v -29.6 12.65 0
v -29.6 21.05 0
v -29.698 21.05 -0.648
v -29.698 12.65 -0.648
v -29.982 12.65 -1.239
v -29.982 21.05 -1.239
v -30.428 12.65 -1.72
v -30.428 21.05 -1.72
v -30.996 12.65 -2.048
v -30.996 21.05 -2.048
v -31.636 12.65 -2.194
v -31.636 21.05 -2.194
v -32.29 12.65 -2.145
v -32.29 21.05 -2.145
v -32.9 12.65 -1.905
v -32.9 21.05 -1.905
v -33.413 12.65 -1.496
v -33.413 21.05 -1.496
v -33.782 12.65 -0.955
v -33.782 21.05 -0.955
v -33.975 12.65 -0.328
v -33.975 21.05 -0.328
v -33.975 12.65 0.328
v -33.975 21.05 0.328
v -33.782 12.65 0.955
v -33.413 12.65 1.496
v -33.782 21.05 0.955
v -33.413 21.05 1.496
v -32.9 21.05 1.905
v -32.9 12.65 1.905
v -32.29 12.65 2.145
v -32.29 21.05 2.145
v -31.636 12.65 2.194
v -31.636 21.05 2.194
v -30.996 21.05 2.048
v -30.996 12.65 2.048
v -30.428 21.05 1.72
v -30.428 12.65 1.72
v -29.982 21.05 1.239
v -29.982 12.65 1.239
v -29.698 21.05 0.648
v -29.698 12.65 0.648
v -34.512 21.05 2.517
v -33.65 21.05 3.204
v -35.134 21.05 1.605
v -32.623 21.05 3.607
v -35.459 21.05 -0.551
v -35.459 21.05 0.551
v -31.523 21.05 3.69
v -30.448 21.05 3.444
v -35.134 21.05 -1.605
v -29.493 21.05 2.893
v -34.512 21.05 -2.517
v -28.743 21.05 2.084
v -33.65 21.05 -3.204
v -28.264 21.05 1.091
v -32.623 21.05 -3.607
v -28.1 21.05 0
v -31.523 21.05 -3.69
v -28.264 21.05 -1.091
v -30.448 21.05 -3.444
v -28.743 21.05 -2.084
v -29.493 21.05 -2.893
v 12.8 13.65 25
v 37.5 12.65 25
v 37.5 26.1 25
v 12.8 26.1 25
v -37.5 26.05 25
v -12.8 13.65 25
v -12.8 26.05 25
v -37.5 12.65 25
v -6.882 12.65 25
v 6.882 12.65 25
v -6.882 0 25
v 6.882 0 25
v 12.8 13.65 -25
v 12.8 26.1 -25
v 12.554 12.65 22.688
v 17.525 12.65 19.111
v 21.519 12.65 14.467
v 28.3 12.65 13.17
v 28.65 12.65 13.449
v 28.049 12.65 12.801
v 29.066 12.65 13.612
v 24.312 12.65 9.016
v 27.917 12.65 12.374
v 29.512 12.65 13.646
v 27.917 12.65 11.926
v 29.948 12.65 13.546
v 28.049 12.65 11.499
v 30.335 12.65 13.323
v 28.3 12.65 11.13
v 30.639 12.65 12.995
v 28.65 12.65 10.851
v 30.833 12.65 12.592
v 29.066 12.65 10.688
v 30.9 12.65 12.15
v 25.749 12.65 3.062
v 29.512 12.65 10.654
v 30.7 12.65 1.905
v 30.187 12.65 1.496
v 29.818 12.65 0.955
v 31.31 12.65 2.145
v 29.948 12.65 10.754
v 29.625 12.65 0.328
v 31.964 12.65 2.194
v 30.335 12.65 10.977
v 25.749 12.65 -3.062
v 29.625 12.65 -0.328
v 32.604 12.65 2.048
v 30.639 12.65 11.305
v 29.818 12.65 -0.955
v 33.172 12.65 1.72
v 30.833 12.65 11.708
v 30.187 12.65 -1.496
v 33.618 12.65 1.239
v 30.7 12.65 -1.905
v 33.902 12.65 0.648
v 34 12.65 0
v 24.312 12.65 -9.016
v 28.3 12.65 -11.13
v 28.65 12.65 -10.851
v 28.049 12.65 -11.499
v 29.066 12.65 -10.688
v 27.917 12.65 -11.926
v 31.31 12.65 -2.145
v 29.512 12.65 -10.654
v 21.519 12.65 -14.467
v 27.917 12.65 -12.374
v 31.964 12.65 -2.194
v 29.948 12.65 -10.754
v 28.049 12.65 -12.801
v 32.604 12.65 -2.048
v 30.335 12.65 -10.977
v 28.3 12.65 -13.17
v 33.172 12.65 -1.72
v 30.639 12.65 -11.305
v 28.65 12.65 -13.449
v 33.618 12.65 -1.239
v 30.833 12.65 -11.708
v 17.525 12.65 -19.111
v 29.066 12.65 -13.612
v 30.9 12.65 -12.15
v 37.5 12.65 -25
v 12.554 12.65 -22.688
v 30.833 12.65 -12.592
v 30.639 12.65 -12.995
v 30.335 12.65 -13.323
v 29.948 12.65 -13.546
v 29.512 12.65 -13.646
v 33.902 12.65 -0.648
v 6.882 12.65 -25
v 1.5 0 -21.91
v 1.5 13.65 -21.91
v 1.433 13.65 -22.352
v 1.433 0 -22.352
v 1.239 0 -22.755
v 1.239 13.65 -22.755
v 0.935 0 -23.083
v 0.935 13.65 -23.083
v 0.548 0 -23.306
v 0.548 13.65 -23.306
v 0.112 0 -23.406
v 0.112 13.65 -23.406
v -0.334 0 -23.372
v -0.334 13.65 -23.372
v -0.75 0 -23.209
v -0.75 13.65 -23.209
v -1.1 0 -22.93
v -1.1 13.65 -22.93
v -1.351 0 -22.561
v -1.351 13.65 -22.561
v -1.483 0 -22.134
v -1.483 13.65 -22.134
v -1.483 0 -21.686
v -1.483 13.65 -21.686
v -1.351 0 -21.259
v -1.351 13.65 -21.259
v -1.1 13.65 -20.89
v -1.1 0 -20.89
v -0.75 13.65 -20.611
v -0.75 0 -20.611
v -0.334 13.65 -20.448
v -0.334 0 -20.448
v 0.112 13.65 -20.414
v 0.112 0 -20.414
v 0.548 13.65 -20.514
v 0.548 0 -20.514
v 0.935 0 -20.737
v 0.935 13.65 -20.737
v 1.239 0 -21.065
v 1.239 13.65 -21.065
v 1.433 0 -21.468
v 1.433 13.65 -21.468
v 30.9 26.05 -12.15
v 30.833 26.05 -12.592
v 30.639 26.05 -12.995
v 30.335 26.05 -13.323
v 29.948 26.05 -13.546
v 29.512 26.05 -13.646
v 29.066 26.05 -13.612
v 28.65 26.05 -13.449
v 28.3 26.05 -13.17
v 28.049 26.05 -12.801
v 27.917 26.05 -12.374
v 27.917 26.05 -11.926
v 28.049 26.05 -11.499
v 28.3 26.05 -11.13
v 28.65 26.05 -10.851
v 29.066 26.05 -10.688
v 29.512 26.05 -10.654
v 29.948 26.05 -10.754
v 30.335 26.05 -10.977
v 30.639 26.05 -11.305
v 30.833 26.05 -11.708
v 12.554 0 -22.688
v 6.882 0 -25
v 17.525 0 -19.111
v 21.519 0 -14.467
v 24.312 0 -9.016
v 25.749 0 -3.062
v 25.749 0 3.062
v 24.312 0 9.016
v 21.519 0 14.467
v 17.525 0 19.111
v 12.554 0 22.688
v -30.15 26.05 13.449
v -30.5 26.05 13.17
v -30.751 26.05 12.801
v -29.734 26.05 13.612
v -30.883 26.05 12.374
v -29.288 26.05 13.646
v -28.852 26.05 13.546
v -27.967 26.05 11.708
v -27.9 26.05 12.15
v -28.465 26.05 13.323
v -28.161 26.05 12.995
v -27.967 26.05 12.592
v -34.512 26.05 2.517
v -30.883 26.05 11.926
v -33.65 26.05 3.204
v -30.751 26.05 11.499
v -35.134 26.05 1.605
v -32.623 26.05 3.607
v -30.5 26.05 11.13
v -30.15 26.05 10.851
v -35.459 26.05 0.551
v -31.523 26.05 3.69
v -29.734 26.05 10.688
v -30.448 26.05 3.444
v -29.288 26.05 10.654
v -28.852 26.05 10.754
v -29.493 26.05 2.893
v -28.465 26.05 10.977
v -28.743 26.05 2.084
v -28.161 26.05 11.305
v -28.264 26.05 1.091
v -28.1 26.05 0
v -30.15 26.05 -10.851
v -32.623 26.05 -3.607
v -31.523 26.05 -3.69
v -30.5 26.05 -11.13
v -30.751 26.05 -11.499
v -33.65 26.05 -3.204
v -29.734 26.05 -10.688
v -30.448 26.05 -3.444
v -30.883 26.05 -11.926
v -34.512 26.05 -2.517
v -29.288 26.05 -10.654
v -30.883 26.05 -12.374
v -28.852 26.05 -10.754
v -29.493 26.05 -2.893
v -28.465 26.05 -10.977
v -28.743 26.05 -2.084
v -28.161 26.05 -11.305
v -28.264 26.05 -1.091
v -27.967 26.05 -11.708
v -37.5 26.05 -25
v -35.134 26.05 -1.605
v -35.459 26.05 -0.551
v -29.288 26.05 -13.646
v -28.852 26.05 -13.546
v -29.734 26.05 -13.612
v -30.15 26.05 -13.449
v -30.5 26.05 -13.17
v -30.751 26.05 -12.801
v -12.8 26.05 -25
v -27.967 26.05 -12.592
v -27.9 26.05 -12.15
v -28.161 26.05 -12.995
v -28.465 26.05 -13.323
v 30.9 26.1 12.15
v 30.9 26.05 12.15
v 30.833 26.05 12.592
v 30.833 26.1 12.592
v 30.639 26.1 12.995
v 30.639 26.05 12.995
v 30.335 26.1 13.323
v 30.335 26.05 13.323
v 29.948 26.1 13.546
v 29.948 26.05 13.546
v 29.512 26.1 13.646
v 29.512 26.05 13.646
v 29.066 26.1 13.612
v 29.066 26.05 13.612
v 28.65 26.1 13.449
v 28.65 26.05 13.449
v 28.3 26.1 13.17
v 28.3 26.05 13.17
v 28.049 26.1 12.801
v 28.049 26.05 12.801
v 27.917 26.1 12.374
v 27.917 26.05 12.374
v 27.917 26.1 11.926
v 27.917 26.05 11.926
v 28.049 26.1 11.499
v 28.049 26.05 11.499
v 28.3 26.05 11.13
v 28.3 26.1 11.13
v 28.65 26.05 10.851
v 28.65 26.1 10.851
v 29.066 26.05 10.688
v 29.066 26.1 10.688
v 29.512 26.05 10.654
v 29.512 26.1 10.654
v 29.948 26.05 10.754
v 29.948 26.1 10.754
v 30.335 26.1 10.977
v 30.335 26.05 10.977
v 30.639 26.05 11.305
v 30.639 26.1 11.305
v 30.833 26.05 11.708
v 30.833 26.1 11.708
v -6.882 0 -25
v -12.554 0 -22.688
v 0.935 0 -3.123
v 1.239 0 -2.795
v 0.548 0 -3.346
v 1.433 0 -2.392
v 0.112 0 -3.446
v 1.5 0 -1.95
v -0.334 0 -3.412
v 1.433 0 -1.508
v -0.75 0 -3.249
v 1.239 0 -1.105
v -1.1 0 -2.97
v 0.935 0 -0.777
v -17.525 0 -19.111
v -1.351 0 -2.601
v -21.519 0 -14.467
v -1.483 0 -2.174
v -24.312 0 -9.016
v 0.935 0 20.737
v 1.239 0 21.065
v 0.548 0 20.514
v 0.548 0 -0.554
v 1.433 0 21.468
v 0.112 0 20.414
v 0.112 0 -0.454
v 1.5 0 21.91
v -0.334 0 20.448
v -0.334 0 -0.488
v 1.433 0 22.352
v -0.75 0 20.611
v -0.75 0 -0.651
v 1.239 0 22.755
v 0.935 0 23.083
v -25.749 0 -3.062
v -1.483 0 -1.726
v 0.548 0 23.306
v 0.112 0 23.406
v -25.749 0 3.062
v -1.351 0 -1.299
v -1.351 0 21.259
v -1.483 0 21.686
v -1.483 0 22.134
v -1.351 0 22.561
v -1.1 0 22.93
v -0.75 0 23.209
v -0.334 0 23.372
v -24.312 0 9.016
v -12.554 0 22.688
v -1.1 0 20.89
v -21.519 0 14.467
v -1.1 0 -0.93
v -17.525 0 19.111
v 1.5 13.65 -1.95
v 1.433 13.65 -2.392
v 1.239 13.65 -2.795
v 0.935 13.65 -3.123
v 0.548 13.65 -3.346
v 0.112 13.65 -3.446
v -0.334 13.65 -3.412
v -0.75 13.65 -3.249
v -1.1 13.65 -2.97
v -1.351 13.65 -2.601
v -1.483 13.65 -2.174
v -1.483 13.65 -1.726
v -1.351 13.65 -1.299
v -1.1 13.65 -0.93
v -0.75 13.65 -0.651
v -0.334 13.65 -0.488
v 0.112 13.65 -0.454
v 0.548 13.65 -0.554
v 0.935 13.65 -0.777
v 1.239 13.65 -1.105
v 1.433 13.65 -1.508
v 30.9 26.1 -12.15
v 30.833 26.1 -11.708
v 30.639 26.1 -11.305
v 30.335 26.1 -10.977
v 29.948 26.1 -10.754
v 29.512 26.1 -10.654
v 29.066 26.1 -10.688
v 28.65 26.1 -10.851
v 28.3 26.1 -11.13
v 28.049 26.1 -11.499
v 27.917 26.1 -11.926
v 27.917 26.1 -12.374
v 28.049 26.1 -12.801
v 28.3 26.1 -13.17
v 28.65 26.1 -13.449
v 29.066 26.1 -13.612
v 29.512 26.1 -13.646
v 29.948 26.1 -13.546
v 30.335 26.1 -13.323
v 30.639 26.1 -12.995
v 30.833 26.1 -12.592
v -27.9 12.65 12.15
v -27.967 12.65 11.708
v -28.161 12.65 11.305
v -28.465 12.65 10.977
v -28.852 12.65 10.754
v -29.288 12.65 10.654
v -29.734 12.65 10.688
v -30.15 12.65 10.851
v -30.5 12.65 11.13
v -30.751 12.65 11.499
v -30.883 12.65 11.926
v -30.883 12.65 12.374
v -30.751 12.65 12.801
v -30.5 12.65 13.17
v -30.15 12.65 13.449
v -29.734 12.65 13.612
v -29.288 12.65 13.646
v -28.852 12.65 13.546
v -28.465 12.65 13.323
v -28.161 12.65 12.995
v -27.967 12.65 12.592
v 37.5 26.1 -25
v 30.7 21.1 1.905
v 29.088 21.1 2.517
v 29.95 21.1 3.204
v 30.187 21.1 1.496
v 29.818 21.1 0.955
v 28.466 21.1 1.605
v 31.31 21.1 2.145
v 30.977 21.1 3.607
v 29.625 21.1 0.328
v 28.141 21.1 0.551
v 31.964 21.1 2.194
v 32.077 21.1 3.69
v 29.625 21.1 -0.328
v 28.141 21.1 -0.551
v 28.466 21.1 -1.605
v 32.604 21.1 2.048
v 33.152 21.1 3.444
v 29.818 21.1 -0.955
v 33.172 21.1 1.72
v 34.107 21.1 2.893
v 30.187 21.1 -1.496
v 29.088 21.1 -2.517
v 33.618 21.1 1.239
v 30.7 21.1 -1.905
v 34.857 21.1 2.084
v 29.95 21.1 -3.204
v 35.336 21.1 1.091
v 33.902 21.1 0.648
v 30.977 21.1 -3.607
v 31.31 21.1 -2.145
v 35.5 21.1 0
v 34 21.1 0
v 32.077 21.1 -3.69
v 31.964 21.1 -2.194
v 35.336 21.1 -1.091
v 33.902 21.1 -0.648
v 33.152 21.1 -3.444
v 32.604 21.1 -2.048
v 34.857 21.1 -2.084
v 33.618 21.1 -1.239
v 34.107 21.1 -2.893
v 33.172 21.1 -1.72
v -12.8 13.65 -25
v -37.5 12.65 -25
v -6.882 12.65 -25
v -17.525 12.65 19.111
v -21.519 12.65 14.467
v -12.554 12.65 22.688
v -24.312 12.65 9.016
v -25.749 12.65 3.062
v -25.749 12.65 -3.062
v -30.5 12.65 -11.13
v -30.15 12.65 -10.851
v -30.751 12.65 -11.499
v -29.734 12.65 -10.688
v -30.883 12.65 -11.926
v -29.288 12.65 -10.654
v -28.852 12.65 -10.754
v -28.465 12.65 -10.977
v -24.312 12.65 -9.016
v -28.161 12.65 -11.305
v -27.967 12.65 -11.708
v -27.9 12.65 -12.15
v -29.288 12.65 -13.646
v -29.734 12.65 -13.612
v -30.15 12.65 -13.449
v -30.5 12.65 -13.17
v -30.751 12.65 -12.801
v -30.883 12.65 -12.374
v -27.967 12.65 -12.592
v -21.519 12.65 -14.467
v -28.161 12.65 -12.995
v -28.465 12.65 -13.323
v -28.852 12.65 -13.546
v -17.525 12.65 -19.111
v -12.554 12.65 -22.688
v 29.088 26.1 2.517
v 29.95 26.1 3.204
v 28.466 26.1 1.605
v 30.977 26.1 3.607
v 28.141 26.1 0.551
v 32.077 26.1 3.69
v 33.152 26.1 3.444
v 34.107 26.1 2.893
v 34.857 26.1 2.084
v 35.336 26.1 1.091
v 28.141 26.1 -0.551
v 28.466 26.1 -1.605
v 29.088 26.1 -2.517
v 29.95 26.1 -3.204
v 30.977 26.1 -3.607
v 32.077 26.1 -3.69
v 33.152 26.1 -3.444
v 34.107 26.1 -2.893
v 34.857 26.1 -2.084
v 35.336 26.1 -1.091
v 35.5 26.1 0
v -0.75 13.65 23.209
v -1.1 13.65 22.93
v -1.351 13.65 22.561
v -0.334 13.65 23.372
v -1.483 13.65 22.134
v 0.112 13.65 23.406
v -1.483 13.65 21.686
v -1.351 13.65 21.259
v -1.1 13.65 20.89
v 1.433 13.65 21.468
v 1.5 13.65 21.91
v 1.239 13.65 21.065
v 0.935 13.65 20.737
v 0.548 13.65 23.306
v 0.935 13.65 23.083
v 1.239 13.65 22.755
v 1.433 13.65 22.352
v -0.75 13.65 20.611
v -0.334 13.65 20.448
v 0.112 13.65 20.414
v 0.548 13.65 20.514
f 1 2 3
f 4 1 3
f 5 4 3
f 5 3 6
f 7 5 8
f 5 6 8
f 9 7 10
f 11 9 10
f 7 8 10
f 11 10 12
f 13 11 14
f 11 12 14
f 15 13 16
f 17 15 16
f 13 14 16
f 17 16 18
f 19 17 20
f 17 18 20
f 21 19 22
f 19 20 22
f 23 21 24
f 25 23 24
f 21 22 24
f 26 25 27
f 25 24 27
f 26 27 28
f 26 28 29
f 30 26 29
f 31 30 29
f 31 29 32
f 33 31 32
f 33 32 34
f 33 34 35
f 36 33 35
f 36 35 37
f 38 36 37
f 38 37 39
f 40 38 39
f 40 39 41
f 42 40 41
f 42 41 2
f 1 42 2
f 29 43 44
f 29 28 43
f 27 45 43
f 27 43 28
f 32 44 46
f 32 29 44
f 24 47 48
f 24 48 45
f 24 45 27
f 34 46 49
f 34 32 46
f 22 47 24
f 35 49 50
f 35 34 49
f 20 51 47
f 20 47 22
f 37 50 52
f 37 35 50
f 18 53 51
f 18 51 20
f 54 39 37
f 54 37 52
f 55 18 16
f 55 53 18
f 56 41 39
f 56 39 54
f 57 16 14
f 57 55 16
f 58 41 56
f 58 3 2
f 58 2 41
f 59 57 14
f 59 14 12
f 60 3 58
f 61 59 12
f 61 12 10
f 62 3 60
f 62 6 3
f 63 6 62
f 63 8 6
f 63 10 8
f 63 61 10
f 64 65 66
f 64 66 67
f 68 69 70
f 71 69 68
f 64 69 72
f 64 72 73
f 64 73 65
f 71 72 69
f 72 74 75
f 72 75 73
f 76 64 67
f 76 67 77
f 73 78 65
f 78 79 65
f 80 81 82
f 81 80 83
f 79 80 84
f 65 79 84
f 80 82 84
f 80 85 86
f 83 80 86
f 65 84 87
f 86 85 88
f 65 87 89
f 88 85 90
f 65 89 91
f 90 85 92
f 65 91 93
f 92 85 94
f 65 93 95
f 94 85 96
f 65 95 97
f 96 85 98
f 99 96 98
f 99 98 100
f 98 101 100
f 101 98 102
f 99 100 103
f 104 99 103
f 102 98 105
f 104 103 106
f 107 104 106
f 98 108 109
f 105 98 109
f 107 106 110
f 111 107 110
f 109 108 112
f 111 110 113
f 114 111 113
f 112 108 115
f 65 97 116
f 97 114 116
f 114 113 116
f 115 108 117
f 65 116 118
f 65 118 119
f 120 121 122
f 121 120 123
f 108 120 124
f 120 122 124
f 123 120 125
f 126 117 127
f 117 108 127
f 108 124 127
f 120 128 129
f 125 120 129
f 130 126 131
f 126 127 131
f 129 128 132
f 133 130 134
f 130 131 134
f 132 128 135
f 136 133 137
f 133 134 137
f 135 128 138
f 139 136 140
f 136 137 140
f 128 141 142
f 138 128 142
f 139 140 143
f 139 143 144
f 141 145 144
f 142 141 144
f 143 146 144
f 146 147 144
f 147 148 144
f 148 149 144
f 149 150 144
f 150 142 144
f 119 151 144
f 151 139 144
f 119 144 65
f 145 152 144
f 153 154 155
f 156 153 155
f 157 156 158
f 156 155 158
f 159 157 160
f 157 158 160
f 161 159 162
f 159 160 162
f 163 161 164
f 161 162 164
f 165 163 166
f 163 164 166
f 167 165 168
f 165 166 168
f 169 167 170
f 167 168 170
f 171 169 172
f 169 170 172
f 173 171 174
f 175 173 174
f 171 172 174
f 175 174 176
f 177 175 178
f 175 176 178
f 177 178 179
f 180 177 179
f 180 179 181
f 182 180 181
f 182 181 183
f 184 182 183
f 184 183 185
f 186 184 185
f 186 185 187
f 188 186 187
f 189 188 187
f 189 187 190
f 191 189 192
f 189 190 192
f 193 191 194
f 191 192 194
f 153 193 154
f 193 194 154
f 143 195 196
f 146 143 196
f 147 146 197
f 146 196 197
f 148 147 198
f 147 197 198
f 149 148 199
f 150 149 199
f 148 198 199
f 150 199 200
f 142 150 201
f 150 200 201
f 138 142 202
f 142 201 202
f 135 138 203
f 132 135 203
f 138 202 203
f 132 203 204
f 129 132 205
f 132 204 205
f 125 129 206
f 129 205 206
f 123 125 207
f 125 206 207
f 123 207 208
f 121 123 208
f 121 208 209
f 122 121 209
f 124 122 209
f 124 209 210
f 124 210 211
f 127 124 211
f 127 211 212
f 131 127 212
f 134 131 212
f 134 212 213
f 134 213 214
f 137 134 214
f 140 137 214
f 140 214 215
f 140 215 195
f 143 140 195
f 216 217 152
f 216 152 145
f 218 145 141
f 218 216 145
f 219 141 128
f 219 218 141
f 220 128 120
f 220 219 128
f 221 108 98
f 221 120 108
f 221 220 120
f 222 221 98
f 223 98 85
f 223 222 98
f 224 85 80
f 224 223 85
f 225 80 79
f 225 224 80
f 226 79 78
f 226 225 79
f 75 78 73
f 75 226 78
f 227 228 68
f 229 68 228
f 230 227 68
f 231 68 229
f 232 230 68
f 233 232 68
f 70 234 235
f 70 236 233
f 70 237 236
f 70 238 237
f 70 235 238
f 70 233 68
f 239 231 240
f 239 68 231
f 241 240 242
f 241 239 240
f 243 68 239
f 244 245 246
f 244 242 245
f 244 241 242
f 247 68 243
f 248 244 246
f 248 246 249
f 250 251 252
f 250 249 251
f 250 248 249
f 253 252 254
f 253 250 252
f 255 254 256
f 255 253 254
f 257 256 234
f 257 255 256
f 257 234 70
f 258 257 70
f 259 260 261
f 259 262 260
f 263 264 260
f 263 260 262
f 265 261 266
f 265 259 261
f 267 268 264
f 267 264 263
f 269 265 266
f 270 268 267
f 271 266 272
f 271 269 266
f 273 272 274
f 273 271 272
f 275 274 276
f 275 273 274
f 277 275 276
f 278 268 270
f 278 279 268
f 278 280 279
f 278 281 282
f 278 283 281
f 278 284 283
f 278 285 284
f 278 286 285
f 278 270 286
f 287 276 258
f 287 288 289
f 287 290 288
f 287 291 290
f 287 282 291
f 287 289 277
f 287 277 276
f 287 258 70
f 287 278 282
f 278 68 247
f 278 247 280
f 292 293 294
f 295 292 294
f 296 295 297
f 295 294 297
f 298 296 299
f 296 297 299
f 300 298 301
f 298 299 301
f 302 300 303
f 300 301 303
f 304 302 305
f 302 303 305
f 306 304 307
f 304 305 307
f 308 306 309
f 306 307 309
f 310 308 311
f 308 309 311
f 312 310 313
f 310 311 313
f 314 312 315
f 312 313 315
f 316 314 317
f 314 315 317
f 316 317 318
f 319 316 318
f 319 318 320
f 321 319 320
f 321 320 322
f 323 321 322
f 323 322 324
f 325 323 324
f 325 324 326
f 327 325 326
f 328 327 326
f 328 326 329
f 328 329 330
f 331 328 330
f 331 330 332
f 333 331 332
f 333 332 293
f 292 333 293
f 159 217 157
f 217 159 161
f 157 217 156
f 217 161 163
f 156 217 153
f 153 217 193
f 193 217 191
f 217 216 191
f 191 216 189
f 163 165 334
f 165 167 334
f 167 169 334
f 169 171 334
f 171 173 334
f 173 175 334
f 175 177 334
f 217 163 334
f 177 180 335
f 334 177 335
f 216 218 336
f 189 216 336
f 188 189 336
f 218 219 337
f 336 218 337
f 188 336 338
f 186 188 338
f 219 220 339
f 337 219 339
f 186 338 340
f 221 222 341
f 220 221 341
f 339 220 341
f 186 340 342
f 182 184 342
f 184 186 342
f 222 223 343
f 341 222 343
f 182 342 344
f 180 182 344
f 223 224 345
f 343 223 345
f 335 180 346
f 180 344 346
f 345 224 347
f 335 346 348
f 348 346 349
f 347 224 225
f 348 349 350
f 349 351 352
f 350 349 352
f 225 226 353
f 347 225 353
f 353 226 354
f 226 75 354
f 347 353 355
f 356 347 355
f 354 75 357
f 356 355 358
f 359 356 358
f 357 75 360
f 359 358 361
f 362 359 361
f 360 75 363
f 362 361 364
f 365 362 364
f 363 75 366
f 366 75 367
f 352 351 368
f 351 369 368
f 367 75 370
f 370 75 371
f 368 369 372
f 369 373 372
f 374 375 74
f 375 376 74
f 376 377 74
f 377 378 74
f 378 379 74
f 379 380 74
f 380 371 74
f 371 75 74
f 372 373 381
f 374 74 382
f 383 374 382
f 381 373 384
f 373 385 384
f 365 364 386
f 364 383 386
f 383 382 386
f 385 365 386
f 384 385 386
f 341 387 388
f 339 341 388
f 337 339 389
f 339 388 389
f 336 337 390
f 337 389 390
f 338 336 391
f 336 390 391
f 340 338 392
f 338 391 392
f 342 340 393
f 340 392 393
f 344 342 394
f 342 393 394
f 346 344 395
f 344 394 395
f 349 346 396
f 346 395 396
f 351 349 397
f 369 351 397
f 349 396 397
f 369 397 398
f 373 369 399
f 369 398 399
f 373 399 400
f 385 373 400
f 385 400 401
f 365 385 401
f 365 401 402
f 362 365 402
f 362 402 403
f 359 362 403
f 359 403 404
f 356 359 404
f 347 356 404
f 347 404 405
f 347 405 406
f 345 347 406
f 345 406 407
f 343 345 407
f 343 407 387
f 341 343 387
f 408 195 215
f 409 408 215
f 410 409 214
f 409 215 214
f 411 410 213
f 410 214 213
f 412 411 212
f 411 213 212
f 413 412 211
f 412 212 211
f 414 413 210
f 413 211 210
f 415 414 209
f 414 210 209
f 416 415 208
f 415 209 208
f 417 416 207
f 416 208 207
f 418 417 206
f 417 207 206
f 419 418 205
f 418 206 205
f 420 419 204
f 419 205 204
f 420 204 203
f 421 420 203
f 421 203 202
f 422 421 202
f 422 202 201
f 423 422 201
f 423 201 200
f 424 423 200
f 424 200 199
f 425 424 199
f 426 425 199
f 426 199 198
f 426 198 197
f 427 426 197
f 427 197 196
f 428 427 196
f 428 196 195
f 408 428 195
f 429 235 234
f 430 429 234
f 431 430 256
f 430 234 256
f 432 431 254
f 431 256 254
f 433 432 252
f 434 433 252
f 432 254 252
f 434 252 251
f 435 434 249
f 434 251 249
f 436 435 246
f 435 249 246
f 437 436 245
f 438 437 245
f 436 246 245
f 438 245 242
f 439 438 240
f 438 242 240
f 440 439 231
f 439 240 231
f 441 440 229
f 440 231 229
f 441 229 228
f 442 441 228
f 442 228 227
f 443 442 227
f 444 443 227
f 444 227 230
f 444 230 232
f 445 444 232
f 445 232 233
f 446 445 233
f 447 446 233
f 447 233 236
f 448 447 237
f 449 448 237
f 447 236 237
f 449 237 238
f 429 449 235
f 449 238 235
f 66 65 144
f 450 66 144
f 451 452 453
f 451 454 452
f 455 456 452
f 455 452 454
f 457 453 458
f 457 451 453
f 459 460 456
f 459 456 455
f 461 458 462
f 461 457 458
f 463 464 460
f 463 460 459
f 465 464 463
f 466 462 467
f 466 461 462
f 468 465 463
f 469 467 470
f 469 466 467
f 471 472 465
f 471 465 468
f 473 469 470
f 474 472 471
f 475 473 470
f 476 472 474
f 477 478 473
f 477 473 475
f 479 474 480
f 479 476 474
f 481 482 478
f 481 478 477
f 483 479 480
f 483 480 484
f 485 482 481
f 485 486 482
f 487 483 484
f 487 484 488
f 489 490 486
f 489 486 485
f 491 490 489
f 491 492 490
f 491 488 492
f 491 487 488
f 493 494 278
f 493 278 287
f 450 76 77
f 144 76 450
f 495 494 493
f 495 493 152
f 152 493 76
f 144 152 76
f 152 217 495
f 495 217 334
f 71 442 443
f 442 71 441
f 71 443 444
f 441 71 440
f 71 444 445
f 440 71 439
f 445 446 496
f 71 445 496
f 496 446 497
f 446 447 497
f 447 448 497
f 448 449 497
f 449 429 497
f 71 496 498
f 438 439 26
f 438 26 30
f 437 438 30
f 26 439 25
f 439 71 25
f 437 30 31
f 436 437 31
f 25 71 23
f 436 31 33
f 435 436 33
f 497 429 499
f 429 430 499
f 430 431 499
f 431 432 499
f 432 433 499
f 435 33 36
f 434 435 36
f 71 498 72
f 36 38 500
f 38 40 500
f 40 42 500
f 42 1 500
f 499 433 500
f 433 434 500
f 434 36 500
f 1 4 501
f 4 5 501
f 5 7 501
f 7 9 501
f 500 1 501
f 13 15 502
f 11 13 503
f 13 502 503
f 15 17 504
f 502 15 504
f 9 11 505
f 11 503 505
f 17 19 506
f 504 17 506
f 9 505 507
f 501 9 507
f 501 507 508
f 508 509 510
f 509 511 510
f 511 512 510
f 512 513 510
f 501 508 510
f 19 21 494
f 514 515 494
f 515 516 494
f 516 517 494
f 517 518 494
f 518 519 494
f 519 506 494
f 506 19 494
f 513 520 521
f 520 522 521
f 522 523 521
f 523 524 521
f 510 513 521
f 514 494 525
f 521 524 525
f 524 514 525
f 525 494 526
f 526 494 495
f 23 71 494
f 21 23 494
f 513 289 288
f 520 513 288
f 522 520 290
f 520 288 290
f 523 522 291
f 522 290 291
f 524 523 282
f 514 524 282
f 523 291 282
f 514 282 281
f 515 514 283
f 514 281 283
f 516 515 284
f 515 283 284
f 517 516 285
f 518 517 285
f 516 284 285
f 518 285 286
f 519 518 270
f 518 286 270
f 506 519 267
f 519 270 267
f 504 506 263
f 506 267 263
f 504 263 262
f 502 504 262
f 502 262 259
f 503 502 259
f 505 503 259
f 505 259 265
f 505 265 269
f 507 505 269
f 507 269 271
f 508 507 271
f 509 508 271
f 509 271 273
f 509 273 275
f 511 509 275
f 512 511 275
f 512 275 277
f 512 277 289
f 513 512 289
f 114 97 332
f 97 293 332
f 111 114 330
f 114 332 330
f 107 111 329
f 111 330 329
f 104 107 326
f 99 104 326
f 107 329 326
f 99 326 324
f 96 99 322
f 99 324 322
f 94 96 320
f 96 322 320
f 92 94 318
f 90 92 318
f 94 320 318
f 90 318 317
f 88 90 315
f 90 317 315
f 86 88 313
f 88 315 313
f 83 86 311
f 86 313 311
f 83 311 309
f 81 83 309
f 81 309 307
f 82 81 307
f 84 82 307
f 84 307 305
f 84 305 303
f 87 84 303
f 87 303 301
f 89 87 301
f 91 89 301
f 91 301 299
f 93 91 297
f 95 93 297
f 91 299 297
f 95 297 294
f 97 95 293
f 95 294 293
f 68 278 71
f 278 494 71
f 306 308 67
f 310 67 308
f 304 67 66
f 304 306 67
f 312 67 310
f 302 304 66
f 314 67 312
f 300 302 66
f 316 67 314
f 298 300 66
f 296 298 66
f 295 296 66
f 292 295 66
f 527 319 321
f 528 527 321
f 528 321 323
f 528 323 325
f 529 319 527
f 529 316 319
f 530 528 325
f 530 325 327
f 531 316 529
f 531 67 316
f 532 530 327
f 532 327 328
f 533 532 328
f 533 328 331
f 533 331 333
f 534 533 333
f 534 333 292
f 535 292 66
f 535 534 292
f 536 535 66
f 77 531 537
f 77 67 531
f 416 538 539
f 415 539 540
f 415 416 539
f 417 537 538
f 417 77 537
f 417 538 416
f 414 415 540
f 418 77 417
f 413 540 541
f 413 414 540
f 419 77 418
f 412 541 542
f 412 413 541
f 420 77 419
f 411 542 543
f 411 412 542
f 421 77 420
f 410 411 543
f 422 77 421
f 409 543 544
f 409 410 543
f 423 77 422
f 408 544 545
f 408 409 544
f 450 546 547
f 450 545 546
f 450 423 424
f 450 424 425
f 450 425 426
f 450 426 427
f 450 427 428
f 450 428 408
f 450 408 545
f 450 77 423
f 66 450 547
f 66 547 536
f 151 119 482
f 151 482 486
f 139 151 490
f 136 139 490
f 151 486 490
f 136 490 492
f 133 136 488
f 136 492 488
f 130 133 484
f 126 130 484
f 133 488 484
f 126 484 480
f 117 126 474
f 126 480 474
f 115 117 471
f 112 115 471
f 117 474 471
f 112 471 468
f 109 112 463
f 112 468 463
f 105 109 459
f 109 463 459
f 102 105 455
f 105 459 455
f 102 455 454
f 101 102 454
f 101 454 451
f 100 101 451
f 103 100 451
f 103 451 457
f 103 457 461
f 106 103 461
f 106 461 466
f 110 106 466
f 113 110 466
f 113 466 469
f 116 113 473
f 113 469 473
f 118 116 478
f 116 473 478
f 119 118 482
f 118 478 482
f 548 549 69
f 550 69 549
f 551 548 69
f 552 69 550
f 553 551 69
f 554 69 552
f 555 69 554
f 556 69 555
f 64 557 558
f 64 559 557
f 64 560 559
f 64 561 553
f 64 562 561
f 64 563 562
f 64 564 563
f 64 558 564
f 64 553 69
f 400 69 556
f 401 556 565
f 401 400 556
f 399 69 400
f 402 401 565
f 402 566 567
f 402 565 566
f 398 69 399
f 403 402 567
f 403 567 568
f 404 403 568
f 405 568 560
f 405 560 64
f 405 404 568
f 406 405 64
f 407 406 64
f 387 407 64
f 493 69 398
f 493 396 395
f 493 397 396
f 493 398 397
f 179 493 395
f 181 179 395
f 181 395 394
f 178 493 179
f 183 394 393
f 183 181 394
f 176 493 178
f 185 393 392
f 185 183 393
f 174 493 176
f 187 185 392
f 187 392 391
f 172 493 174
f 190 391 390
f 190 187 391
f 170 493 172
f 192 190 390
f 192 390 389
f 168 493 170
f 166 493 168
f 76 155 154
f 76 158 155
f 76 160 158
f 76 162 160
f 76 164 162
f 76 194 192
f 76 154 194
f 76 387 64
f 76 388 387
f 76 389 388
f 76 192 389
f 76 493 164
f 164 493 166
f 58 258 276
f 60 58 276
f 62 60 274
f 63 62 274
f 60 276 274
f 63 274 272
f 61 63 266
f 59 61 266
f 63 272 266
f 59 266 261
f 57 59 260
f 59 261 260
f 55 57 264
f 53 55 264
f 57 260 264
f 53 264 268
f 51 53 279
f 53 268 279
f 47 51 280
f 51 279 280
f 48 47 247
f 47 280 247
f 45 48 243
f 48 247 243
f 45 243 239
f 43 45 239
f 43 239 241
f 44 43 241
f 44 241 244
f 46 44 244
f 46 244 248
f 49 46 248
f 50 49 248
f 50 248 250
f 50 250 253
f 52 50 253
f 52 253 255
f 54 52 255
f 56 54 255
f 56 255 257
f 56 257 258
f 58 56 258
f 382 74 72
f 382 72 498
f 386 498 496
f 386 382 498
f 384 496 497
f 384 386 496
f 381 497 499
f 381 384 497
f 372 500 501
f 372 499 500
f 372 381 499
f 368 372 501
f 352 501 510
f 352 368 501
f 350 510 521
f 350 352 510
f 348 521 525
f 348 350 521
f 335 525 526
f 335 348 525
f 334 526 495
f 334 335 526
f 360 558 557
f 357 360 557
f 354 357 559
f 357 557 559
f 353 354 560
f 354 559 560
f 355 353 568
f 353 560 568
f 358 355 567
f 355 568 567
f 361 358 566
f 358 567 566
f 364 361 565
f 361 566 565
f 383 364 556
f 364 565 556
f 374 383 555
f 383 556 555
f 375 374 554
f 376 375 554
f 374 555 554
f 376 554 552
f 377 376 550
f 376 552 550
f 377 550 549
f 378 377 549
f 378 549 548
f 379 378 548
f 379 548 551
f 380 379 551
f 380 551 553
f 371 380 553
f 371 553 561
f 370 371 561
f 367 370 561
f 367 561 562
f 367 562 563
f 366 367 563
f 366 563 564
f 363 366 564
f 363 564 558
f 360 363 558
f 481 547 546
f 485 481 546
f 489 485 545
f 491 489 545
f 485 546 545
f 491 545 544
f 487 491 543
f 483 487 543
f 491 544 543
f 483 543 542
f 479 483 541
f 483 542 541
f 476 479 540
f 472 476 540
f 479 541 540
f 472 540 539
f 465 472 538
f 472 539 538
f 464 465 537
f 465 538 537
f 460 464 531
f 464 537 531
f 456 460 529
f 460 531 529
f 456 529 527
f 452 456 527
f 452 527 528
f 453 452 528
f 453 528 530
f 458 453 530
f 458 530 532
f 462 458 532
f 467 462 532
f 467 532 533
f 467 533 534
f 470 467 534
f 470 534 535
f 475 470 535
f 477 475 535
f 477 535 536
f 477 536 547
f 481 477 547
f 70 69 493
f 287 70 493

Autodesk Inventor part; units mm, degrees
ref_plane "YZ Plane" through (0, 0, 0) normal (1, 0, 0) x (0, 1, 0)
ref_plane "XZ Plane" through (0, 0, 0) normal (0, 1, 0) x (-1, 0, 0)
ref_plane "XY Plane" through (0, 0, 0) normal (0, 0, 1) x (1, 0, 0)
sketch "Sketch1" plane through (0, 0, 0) normal (0, 1, 0) x (-1, 0, 0)
  line L0 (37.5, -25) -> (-37.5, -25) construction
  line L1 (-37.5, -25) -> (-37.5, 25) construction
  line L2 (-37.5, 25) -> (37.5, 25) construction
  line L3 (37.5, 25) -> (37.5, -25) construction
  arc A0 (6.8822, -25) -> (6.8822, 25) centre (0, 0) ccw
  arc A1 (-6.8822, 25) -> (-6.8822, -25) centre (0, 0) ccw
  line L4 (6.8822, -25) -> (-6.8822, -25)
  line L5 (-6.8822, 25) -> (6.8822, 25)
  dimension "d4" = 50
  dimension "d5" = 75
extrude "Extrusion1" add sketch "Sketch1" along normal blind 12.65
sketch "Sketch2" plane through (0, 12.65, 0) normal (0, 1, 0) x (1, 0, 0)
  line L0 (-37.5, 25) -> (37.5, 25) construction
  line L1 (-37.5, -25) -> (-37.5, 25) construction
  line L2 (37.5, 25) -> (37.5, -25) construction
  line L3 (37.5, -25) -> (-37.5, -25) construction
  line L4 (-37.5, 25) -> (37.5, 25)
  line L5 (37.5, -25) -> (37.5, 25)
  line L6 (37.5, -25) -> (-37.5, -25)
  line L7 (-37.5, -25) -> (-37.5, 25)
  point P0 (0, 0)
extrude "Extrusion2" add sketch "Sketch2" along normal blind 1
sketch "Sketch3" plane through (0, 13.65, 0) normal (0, 1, 0) x (1, 0, 0)
  line L0 (37.5, -25) -> (6.8822, -25) projected
  line L1 (12.8, -25) -> (12.8, 25)
  line L2 (12.8, 25) -> (37.5, 25)
  line L3 (37.5, -25) -> (37.5, 25) projected
  line L4 (37.5, 25) -> (37.5, -25)
  line L5 (37.5, -25) -> (12.8, -25)
  line L6 (-12.8, -25) -> (-12.8, 25)
  line L7 (-37.5, 25) -> (-37.5, -25) projected
  line L8 (-12.8, 25) -> (-37.5, 25)
  line L9 (-37.5, 25) -> (-37.5, -25)
  line L10 (-37.5, -25) -> (-12.8, -25)
  point P0 (0, 0)
  dimension "d12" = 25.6
  dimension "d13" = 24.7
  dimension "d14" = 24.7
extrude "Extrusion3" add sketch "Sketch3" along normal blind 12.4 contours L10 L7 L8 L6
extrude "Extrusion4" add sketch "Sketch3" along normal blind 12.45 contours L0 L1 L2 L3
sketch "Sketch4" plane through (0, 13.65, 0) normal (0, 1, 0) x (1, 0, 0)
  circle A0 centre (0, 21.91) radius 1.5
  circle A1 centre (0, -21.91) radius 1.5
  circle A2 centre (0, 1.95) radius 1.5
  line L0 (12.8, 25) -> (12.8, -25) projected
  point P0 (0, 0)
  dimension "d21" = 3
  dimension "d23" = 3
  dimension "d25" = 3
  dimension "d26" = 21.91
  dimension "d27" = 23.86
  dimension "d28" = 21.91
  dimension "d29" = 12.8
extrude "Extrusion5" cut sketch "Sketch4" against normal blind 18.8
sketch "Sketch5" plane through (0, 26.05, 0) normal (0, 1, 0) x (1, 0, 0)
  circle A0 centre (-29.4, 12.15) radius 1.5
  circle A1 centre (-29.4, -12.15) radius 1.5
  circle A2 centre (-31.8, 0) radius 2.2
  line L0 (-37.5, 25) -> (-37.5, -25) projected
  circle A3 centre (29.4, 12.15) radius 1.5
  circle A4 centre (29.4, -12.15) radius 1.5
  circle A5 centre (31.8, 0) radius 2.2
  circle A6 centre (29.4, 12.15) radius 1.5
  circle A7 centre (29.4, -12.15) radius 1.5
  circle A8 centre (31.8, 0) radius 2.2
  point P0 (0, 0)
  dimension "d35" = 3
  dimension "d36" = 3
  dimension "d37" = 4.4
  dimension "d38" = 8.1
  dimension "d41" = 5.7
extrude "Extrusion6" cut sketch "Sketch5" along normal mid plane 35
sketch "Sketch7" plane through (0, 26.1, 0) normal (0, 1, 0) x (1, 0, 0)
  circle A0 centre (31.8, 0) radius 3.7
  point P0 (0, 0)
  dimension "d44" = 7.4
extrude "Extrusion7" cut sketch "Sketch7" against normal blind 5
sketch "Sketch8" plane through (0, 26.05, 0) normal (0, 1, 0) x (1, 0, 0)
  circle A0 centre (-31.8, 0) radius 3.7
  point P0 (0, 0)
  dimension "d47" = 7.4
extrude "Extrusion8" cut sketch "Sketch8" against normal blind 5
properties part number "PocketNC_Vise_Backing_Plate" material "Aluminum 6061"
